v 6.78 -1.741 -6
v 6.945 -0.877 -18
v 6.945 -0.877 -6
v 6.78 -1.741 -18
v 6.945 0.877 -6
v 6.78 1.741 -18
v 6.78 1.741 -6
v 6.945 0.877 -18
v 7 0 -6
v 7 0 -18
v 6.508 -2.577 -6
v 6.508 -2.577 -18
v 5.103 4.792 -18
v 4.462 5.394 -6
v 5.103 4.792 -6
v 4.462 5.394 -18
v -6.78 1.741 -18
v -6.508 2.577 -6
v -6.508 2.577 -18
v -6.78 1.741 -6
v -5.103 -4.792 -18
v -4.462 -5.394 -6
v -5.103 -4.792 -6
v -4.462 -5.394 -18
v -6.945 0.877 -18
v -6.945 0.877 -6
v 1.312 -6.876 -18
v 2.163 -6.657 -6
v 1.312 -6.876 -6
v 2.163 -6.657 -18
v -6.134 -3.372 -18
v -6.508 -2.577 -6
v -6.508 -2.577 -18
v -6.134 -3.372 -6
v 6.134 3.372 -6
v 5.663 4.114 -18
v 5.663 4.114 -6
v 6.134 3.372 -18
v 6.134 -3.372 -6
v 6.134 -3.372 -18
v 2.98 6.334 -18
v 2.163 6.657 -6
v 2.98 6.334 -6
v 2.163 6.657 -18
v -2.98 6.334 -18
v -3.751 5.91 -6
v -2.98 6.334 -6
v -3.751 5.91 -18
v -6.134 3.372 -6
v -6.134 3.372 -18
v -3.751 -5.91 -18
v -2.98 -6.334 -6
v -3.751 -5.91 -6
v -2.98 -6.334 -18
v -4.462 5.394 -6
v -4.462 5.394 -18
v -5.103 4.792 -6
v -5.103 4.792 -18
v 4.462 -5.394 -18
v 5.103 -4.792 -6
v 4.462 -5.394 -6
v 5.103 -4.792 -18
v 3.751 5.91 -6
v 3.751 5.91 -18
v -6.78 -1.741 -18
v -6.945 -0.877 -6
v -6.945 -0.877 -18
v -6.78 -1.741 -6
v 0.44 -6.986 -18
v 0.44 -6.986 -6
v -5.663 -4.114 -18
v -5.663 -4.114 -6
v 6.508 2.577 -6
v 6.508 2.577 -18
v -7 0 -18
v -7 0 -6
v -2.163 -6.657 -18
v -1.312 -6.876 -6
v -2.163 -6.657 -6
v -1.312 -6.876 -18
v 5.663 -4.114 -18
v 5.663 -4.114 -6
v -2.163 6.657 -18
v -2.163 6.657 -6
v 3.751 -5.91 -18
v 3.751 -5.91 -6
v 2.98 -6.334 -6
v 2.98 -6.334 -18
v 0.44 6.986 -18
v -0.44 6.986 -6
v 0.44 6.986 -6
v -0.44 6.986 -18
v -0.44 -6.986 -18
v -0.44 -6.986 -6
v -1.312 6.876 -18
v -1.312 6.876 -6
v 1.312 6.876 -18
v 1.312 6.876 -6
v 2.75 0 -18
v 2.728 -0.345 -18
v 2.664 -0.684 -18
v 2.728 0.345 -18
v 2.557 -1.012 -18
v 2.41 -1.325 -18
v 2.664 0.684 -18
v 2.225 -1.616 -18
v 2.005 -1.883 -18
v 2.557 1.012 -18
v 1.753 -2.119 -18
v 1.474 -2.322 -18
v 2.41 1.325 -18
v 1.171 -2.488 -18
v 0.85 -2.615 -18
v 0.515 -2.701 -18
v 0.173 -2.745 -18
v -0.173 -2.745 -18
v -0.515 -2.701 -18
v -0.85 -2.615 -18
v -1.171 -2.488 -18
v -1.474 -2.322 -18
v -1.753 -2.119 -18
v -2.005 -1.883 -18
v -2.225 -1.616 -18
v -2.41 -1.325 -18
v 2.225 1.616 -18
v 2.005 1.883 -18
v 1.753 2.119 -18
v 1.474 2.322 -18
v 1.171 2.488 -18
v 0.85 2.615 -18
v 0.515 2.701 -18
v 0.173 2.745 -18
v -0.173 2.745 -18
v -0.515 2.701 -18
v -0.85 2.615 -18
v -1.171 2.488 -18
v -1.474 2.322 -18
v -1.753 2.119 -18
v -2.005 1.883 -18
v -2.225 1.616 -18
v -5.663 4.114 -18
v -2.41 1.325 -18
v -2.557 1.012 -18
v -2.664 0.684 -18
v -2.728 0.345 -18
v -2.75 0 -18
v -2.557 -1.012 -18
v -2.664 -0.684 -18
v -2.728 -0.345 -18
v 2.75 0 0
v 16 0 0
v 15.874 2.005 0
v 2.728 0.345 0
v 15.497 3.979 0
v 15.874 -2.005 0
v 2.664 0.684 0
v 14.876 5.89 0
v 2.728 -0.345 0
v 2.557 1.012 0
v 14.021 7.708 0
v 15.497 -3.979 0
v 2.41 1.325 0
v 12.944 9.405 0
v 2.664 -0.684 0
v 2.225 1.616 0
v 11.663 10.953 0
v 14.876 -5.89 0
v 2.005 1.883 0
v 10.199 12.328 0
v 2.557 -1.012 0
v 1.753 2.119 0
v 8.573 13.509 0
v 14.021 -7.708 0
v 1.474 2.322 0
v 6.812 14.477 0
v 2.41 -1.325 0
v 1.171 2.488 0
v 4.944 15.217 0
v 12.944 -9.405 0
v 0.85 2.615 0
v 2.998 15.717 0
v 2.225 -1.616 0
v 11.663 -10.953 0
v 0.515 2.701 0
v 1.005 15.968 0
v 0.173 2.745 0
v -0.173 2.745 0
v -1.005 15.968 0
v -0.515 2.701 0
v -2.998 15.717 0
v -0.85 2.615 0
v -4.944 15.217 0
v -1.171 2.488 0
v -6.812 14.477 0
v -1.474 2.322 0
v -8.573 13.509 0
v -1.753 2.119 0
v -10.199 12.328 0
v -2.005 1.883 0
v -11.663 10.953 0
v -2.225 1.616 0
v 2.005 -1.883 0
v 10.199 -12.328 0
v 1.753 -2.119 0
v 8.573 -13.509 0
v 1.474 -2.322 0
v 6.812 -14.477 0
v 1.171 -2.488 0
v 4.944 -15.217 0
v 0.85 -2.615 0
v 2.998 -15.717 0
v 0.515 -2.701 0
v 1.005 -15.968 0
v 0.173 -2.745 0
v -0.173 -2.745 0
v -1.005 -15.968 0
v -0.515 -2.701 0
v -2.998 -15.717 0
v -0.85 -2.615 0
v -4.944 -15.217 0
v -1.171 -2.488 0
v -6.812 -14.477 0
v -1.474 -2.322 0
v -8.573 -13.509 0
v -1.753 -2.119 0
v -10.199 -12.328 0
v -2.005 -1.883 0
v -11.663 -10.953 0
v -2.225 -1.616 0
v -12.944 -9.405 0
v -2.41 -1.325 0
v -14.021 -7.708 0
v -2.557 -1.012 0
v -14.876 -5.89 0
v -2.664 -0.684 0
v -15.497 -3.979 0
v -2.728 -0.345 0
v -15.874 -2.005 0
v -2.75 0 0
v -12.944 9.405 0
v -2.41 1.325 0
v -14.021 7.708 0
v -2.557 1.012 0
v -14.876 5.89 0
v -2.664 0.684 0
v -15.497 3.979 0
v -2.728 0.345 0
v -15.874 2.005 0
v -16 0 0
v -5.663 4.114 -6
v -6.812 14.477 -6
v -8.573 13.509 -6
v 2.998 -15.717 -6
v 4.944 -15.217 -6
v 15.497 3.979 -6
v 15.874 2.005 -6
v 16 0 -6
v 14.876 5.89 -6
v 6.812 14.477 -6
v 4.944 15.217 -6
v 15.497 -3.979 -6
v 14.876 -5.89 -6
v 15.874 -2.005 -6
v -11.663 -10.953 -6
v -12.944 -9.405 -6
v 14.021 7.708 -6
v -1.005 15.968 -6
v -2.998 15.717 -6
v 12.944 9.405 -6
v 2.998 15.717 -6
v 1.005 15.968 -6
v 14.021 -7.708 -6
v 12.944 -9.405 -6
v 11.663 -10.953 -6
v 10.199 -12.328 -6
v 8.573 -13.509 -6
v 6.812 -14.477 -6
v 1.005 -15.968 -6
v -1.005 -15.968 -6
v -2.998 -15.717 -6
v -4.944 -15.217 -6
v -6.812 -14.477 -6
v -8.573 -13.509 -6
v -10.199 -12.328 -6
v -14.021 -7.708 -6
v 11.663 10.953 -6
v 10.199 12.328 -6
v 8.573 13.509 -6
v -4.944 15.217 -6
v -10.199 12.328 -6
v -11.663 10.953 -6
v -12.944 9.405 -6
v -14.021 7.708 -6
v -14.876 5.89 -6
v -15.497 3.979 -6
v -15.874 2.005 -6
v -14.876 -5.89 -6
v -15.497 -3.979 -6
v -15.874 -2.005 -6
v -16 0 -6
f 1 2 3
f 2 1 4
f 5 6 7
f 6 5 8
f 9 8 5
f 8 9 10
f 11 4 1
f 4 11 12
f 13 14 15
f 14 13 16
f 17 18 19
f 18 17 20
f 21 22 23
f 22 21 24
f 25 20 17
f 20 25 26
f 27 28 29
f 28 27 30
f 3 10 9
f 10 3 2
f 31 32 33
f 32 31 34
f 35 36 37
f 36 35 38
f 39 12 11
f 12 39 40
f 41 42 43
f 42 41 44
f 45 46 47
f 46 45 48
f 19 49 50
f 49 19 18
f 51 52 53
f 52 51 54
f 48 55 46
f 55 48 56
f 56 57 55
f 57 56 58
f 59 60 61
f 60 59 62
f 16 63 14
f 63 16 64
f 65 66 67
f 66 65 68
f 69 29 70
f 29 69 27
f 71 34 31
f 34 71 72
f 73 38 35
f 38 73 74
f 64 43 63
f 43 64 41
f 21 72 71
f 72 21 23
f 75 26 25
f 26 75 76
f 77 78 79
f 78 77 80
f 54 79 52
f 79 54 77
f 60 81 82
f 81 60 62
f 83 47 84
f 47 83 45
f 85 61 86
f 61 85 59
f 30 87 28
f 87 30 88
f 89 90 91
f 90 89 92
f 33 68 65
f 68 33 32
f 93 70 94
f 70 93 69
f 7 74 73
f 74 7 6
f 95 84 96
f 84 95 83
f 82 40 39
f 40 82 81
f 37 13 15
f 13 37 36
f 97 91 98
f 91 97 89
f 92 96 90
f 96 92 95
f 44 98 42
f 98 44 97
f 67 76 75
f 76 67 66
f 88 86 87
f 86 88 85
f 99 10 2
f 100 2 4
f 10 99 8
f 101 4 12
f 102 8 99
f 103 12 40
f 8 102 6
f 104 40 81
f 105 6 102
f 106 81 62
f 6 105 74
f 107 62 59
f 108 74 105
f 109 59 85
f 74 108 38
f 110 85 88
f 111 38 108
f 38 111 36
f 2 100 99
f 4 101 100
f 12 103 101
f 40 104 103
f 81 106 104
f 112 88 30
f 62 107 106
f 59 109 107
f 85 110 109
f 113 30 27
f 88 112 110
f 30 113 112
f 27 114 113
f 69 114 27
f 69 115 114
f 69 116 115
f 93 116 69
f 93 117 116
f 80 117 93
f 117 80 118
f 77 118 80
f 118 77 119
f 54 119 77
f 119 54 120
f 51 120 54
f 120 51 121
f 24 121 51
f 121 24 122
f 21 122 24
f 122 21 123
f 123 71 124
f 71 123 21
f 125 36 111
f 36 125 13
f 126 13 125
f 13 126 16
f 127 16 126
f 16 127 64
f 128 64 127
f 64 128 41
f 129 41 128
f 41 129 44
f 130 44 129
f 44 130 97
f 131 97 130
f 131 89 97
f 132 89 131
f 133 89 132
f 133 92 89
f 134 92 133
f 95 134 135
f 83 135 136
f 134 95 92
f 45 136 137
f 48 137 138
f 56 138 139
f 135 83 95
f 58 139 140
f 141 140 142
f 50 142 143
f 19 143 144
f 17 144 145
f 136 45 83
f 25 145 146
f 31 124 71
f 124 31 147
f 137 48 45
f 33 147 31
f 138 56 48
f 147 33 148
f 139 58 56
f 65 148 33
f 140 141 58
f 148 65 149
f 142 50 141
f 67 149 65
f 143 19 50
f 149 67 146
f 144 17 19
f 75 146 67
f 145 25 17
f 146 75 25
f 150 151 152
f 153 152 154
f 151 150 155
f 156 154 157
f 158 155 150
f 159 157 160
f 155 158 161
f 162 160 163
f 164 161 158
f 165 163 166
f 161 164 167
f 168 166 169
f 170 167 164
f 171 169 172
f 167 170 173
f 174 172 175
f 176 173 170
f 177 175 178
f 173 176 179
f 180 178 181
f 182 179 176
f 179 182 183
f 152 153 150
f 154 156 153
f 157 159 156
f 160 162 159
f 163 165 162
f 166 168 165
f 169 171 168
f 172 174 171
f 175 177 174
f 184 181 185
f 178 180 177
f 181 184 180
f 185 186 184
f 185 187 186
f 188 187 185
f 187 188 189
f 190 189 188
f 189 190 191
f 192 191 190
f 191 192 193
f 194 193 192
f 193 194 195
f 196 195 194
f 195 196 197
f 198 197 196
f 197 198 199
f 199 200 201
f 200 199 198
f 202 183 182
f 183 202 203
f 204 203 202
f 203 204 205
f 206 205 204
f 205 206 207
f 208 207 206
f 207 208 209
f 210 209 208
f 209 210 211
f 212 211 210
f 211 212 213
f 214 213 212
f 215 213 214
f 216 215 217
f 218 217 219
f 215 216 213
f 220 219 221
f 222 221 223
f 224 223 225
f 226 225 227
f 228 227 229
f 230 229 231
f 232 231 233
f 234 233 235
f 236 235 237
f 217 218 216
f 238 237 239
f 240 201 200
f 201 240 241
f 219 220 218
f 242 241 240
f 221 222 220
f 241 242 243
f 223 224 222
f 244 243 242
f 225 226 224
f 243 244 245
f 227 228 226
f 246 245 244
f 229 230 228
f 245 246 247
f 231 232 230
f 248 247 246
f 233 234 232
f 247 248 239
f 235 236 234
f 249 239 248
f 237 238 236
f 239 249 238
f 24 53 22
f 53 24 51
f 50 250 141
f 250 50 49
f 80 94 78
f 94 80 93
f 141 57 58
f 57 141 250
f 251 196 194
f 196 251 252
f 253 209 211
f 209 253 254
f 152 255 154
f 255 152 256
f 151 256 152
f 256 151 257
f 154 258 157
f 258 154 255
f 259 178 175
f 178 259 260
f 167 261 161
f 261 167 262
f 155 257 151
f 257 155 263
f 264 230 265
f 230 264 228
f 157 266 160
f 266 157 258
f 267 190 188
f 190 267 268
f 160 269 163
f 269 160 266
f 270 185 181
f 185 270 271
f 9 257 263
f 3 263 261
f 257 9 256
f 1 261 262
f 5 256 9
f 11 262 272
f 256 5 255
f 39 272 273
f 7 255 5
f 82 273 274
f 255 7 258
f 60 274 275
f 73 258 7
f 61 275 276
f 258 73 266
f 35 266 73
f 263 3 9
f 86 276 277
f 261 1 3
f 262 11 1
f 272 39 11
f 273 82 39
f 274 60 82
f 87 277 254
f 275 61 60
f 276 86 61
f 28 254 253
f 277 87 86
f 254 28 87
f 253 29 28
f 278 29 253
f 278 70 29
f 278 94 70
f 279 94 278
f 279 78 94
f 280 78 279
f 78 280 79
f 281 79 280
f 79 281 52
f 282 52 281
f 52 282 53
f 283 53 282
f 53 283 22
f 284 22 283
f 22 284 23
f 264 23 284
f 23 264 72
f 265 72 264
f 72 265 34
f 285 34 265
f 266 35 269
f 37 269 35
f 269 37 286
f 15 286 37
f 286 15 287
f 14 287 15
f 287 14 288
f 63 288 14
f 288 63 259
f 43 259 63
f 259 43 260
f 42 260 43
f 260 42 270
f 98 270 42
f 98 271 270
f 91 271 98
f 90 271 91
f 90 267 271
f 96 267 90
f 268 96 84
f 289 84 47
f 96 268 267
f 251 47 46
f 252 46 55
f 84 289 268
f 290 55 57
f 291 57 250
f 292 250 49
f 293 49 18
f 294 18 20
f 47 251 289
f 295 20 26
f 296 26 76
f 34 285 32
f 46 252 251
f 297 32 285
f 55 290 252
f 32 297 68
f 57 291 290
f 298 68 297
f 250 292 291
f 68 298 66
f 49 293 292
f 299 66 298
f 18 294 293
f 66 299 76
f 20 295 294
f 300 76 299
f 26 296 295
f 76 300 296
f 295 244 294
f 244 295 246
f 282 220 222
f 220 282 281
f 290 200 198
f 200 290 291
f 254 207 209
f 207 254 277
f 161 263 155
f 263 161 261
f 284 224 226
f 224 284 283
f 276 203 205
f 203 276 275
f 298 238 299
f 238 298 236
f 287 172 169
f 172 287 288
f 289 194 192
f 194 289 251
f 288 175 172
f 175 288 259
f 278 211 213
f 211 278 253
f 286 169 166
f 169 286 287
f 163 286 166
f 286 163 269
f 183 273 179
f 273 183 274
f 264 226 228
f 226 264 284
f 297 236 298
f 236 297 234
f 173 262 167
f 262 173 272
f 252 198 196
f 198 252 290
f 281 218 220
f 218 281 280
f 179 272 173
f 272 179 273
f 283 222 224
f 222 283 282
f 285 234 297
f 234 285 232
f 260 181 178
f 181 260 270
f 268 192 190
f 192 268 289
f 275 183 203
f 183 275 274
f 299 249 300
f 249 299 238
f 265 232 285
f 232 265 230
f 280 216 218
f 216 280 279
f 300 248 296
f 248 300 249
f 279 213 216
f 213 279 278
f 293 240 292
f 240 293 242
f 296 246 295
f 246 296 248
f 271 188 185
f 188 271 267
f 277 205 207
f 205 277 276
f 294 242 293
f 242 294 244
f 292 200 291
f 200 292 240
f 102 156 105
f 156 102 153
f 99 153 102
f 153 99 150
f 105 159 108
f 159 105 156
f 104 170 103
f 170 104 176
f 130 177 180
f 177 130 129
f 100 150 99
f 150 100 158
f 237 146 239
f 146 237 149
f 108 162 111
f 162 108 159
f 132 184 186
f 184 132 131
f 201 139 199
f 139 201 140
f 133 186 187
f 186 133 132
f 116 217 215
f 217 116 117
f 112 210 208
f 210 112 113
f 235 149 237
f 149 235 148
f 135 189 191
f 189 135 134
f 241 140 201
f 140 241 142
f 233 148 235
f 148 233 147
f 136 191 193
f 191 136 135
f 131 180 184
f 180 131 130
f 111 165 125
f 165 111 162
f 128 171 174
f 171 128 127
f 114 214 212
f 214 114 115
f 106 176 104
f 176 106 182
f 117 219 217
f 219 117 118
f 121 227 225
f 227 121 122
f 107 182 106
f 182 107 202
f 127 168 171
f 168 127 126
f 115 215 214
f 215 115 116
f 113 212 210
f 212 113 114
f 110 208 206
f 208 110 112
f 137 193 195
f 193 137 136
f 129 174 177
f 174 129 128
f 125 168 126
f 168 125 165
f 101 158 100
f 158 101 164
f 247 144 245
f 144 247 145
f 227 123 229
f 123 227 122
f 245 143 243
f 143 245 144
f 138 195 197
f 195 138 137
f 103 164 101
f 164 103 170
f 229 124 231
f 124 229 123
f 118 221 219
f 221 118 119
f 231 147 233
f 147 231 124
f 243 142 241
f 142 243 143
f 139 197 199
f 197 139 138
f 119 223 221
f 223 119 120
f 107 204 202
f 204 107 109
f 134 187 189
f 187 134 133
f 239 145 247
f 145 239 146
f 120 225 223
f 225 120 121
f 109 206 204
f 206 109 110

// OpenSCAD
$fn = 50;


difference() {
	union() {
		translate(v = [0, 0, -18.0000000000]) {
			cylinder(h = 18, r = 7.0000000000);
		}
		translate(v = [0, 0, -6.0000000000]) {
			cylinder(h = 6, r = 16.0000000000);
		}
	}
	union() {
		#translate(v = [0, 0, -18]) {
			cylinder(h = 18, r = 2.7500000000);
		}
	}
}
